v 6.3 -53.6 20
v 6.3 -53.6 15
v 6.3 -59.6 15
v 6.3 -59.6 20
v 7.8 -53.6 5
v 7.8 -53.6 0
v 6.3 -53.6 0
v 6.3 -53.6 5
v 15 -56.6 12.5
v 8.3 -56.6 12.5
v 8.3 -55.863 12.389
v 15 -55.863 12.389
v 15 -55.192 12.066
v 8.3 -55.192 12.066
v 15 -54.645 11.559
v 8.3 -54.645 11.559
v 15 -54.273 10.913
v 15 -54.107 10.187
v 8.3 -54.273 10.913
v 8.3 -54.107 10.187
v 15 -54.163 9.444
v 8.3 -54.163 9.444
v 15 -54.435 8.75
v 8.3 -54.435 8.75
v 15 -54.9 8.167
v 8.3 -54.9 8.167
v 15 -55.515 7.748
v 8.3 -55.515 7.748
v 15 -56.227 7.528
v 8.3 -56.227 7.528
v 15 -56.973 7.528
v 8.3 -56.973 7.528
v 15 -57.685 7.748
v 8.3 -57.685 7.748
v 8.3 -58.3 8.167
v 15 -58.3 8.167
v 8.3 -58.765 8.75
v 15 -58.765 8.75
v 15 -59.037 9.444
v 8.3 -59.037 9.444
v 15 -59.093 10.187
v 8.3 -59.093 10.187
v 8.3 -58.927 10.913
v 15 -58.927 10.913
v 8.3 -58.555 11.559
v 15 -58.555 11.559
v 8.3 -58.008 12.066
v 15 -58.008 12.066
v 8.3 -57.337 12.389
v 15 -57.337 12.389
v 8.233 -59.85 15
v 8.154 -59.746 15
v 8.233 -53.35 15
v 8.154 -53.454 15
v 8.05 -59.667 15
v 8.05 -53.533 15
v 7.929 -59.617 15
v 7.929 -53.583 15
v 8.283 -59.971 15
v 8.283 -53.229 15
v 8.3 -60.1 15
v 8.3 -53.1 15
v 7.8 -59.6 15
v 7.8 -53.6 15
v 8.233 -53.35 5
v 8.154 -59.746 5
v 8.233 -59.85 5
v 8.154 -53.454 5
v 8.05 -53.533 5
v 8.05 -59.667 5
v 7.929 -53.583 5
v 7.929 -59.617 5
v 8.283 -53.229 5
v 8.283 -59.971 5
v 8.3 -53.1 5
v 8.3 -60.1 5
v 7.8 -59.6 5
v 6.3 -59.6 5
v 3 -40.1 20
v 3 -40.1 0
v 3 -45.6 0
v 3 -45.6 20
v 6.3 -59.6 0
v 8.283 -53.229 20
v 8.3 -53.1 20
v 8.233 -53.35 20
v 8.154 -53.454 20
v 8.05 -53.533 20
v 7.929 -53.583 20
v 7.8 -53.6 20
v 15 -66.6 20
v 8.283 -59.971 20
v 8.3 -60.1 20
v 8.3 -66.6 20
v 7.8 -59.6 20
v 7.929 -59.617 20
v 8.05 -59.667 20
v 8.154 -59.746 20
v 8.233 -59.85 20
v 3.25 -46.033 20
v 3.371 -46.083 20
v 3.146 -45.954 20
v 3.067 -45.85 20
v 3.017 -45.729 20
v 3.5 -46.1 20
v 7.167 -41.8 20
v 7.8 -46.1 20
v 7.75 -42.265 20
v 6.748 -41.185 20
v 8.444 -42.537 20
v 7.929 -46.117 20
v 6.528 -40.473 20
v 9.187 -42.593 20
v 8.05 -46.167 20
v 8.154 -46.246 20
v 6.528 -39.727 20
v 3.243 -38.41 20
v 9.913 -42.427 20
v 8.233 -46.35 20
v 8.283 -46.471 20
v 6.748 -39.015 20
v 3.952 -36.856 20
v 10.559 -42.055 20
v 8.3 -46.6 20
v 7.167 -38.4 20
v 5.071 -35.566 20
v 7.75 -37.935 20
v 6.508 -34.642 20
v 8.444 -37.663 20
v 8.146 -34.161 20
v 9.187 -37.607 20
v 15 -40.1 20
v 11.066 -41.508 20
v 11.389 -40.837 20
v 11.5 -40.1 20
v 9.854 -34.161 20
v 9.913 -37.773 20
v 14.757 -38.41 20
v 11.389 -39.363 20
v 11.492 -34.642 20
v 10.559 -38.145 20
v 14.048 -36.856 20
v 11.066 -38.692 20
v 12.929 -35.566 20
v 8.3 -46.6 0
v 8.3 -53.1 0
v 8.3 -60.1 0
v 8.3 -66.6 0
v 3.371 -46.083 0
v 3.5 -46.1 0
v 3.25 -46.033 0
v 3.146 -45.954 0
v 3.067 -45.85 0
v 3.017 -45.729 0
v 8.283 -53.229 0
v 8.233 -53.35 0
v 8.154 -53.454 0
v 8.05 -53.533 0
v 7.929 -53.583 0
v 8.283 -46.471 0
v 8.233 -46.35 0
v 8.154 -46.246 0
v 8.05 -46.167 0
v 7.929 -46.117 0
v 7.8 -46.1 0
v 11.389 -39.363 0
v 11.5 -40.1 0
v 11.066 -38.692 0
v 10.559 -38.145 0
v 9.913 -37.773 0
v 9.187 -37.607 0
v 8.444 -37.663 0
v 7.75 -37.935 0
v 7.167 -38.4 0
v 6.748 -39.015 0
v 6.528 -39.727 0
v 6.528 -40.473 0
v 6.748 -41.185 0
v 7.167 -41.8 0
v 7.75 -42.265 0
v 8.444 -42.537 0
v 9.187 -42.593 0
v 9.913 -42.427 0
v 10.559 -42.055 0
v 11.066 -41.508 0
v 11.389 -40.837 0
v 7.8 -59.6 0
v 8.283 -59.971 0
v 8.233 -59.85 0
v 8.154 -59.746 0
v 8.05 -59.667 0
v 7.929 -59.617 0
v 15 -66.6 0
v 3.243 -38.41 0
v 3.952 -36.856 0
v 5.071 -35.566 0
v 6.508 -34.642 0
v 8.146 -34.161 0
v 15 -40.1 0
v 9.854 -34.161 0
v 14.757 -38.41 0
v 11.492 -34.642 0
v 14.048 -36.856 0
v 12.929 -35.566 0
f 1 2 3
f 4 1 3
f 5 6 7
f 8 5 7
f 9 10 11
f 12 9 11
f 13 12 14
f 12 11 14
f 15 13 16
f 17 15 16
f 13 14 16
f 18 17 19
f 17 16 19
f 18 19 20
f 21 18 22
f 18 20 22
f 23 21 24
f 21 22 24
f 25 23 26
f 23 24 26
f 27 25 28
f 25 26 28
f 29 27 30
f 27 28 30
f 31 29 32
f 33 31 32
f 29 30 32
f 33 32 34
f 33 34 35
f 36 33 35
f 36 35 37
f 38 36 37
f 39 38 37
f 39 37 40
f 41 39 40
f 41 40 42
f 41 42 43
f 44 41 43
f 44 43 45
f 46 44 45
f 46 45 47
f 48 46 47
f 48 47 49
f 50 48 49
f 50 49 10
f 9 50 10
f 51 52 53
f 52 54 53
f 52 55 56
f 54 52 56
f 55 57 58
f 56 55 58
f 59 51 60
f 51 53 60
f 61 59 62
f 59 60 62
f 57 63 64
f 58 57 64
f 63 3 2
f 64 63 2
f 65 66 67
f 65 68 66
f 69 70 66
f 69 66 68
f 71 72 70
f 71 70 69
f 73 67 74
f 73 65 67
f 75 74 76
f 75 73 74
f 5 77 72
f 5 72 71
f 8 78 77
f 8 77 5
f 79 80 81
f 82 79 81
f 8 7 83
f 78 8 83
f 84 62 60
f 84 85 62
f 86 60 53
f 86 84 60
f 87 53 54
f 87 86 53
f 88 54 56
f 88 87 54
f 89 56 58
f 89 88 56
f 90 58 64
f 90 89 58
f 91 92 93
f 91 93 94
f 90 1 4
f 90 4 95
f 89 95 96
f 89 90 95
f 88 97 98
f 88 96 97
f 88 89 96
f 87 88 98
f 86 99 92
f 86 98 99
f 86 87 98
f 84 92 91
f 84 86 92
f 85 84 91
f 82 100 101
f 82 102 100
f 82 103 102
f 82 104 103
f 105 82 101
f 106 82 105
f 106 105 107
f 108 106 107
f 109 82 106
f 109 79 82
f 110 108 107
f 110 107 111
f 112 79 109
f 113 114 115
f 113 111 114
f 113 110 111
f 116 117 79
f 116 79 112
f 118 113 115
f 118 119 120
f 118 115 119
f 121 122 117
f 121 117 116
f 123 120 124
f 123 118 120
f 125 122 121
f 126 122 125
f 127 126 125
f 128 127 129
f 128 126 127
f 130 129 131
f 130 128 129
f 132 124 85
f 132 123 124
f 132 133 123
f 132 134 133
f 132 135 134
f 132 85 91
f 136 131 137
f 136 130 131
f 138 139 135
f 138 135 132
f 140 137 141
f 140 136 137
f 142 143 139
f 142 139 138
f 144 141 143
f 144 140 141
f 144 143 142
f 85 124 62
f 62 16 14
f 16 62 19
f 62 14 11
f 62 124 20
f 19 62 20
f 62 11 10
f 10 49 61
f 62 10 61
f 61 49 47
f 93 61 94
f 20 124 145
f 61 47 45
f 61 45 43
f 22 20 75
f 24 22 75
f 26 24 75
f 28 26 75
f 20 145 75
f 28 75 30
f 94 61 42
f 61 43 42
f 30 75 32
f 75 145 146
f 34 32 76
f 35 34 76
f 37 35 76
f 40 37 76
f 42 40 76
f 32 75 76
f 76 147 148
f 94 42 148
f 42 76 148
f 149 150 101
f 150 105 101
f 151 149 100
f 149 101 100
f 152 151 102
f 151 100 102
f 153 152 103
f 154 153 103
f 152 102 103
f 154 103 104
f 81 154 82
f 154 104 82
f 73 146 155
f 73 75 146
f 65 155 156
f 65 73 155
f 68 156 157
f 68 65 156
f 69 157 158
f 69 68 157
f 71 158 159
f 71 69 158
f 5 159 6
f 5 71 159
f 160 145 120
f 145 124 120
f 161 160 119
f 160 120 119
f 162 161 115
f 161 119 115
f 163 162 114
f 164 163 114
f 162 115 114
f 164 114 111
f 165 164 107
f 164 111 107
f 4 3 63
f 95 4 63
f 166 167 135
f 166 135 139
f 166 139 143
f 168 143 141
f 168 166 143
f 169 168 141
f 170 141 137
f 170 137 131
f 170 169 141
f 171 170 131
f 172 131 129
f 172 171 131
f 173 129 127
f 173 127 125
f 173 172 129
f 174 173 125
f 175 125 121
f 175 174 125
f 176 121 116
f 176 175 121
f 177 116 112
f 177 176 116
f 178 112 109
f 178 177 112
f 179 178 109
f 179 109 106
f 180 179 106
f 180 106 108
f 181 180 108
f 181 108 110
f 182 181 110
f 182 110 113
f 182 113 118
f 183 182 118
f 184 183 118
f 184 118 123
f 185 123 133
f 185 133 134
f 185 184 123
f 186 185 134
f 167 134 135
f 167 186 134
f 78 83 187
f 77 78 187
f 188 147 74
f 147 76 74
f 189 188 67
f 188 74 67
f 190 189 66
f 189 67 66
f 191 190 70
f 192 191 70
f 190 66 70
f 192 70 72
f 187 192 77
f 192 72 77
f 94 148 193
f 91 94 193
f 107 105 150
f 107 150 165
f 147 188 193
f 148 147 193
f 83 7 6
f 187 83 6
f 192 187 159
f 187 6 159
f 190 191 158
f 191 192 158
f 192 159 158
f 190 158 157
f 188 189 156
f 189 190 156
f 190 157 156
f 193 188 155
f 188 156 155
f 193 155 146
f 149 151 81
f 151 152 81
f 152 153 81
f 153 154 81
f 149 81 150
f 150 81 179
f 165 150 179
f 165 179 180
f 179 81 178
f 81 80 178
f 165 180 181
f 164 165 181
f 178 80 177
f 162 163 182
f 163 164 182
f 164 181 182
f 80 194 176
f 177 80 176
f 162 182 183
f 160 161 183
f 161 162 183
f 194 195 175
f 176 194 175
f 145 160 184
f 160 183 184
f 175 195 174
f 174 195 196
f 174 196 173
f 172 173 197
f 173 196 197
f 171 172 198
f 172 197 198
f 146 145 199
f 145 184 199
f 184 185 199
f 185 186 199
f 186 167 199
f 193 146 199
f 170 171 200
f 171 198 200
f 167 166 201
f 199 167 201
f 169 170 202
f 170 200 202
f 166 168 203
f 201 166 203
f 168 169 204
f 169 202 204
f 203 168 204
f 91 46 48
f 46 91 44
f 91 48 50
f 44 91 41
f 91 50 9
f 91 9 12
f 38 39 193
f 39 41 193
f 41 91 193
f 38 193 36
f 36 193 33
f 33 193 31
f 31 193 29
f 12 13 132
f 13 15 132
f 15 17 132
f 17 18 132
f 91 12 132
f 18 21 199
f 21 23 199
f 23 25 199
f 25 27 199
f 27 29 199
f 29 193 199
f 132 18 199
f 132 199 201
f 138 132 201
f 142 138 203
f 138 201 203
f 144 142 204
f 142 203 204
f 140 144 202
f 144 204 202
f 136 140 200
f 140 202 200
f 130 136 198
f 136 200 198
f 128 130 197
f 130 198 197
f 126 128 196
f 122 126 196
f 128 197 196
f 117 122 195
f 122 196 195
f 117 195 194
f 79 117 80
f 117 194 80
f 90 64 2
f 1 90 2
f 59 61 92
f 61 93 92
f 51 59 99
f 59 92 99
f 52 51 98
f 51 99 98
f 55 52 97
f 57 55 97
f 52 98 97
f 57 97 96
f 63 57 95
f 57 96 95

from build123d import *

# Parameters (mm, degrees)
SKETCH1_R           = 2.5
BOSS_EXTRUDE1_DEPTH = 20
SKETCH2_R           = 2.5
CUT_EXTRUDE1_DEPTH  = 20
SKETCH3_W           = 10
SKETCH3_H           = 6
CUT_EXTRUDE2_DEPTH  = 2
FILLET1_R           = 0.5
FILLET2_R           = 0.5


with BuildPart() as part:
    # Sketch1 → Boss-Extrude1 (new body)
    with BuildSketch(Plane.XY):
        with BuildLine():
            Line((6.3, -53.6), (6.3, -59.6))
            Line((6.3, -59.6), (7.3, -59.6))
            Line((7.3, -59.6), (8.3, -59.6))
            Line((8.3, -59.6), (8.3, -60.1))
            Line((8.3, -60.1), (8.3, -66.6))
            Line((8.3, -66.6), (15, -66.6))
            Line((15, -66.6), (15, -40.1))
            ThreePointArc((15, -40.1), (9, -34.1), (3, -40.1))
            Line((3, -40.1), (3, -46.1))
            Line((3, -46.1), (8.3, -46.1))
            Line((8.3, -46.1), (8.3, -46.6))
            Line((8.3, -46.6), (8.3, -53.1))
            Line((8.3, -53.1), (8.3, -53.6))
            Line((8.3, -53.6), (7.3, -53.6))
            Line((7.3, -53.6), (6.3, -53.6))
        make_face()
        with Locations((9, -40.1)):
            Circle(SKETCH1_R, mode=Mode.SUBTRACT)
    extrude(amount=BOSS_EXTRUDE1_DEPTH)

    # Sketch2 → Cut-Extrude1 (cut)
    with BuildSketch(Plane.ZY.offset(-6.3)):
        with Locations((10, -56.6)):
            Circle(SKETCH2_R)
    extrude(amount=-CUT_EXTRUDE1_DEPTH, mode=Mode.SUBTRACT)

    # Sketch3 → Cut-Extrude2 (cut)
    with BuildSketch(Plane.ZY.offset(-6.3)):
        with Locations((10, -56.6)):
            Rectangle(SKETCH3_W, SKETCH3_H)
    extrude(amount=-CUT_EXTRUDE2_DEPTH, mode=Mode.SUBTRACT)

    # Fillet1
    fillet1_edges = [part.edges().sort_by_distance(p)[0] for p in [
        (8.3, -46.1, 10),
        (3, -46.1, 10),
    ]]
    fillet(fillet1_edges, radius=FILLET1_R)

    # Fillet2
    fillet2_edges = [part.edges().sort_by_distance(p)[0] for p in [
        (8.3, -59.6, 17.5),
        (8.3, -53.6, 17.5),
        (8.3, -53.6, 2.5),
        (8.3, -59.6, 2.5),
    ]]
    fillet(fillet2_edges, radius=FILLET2_R)


solid = part.part
